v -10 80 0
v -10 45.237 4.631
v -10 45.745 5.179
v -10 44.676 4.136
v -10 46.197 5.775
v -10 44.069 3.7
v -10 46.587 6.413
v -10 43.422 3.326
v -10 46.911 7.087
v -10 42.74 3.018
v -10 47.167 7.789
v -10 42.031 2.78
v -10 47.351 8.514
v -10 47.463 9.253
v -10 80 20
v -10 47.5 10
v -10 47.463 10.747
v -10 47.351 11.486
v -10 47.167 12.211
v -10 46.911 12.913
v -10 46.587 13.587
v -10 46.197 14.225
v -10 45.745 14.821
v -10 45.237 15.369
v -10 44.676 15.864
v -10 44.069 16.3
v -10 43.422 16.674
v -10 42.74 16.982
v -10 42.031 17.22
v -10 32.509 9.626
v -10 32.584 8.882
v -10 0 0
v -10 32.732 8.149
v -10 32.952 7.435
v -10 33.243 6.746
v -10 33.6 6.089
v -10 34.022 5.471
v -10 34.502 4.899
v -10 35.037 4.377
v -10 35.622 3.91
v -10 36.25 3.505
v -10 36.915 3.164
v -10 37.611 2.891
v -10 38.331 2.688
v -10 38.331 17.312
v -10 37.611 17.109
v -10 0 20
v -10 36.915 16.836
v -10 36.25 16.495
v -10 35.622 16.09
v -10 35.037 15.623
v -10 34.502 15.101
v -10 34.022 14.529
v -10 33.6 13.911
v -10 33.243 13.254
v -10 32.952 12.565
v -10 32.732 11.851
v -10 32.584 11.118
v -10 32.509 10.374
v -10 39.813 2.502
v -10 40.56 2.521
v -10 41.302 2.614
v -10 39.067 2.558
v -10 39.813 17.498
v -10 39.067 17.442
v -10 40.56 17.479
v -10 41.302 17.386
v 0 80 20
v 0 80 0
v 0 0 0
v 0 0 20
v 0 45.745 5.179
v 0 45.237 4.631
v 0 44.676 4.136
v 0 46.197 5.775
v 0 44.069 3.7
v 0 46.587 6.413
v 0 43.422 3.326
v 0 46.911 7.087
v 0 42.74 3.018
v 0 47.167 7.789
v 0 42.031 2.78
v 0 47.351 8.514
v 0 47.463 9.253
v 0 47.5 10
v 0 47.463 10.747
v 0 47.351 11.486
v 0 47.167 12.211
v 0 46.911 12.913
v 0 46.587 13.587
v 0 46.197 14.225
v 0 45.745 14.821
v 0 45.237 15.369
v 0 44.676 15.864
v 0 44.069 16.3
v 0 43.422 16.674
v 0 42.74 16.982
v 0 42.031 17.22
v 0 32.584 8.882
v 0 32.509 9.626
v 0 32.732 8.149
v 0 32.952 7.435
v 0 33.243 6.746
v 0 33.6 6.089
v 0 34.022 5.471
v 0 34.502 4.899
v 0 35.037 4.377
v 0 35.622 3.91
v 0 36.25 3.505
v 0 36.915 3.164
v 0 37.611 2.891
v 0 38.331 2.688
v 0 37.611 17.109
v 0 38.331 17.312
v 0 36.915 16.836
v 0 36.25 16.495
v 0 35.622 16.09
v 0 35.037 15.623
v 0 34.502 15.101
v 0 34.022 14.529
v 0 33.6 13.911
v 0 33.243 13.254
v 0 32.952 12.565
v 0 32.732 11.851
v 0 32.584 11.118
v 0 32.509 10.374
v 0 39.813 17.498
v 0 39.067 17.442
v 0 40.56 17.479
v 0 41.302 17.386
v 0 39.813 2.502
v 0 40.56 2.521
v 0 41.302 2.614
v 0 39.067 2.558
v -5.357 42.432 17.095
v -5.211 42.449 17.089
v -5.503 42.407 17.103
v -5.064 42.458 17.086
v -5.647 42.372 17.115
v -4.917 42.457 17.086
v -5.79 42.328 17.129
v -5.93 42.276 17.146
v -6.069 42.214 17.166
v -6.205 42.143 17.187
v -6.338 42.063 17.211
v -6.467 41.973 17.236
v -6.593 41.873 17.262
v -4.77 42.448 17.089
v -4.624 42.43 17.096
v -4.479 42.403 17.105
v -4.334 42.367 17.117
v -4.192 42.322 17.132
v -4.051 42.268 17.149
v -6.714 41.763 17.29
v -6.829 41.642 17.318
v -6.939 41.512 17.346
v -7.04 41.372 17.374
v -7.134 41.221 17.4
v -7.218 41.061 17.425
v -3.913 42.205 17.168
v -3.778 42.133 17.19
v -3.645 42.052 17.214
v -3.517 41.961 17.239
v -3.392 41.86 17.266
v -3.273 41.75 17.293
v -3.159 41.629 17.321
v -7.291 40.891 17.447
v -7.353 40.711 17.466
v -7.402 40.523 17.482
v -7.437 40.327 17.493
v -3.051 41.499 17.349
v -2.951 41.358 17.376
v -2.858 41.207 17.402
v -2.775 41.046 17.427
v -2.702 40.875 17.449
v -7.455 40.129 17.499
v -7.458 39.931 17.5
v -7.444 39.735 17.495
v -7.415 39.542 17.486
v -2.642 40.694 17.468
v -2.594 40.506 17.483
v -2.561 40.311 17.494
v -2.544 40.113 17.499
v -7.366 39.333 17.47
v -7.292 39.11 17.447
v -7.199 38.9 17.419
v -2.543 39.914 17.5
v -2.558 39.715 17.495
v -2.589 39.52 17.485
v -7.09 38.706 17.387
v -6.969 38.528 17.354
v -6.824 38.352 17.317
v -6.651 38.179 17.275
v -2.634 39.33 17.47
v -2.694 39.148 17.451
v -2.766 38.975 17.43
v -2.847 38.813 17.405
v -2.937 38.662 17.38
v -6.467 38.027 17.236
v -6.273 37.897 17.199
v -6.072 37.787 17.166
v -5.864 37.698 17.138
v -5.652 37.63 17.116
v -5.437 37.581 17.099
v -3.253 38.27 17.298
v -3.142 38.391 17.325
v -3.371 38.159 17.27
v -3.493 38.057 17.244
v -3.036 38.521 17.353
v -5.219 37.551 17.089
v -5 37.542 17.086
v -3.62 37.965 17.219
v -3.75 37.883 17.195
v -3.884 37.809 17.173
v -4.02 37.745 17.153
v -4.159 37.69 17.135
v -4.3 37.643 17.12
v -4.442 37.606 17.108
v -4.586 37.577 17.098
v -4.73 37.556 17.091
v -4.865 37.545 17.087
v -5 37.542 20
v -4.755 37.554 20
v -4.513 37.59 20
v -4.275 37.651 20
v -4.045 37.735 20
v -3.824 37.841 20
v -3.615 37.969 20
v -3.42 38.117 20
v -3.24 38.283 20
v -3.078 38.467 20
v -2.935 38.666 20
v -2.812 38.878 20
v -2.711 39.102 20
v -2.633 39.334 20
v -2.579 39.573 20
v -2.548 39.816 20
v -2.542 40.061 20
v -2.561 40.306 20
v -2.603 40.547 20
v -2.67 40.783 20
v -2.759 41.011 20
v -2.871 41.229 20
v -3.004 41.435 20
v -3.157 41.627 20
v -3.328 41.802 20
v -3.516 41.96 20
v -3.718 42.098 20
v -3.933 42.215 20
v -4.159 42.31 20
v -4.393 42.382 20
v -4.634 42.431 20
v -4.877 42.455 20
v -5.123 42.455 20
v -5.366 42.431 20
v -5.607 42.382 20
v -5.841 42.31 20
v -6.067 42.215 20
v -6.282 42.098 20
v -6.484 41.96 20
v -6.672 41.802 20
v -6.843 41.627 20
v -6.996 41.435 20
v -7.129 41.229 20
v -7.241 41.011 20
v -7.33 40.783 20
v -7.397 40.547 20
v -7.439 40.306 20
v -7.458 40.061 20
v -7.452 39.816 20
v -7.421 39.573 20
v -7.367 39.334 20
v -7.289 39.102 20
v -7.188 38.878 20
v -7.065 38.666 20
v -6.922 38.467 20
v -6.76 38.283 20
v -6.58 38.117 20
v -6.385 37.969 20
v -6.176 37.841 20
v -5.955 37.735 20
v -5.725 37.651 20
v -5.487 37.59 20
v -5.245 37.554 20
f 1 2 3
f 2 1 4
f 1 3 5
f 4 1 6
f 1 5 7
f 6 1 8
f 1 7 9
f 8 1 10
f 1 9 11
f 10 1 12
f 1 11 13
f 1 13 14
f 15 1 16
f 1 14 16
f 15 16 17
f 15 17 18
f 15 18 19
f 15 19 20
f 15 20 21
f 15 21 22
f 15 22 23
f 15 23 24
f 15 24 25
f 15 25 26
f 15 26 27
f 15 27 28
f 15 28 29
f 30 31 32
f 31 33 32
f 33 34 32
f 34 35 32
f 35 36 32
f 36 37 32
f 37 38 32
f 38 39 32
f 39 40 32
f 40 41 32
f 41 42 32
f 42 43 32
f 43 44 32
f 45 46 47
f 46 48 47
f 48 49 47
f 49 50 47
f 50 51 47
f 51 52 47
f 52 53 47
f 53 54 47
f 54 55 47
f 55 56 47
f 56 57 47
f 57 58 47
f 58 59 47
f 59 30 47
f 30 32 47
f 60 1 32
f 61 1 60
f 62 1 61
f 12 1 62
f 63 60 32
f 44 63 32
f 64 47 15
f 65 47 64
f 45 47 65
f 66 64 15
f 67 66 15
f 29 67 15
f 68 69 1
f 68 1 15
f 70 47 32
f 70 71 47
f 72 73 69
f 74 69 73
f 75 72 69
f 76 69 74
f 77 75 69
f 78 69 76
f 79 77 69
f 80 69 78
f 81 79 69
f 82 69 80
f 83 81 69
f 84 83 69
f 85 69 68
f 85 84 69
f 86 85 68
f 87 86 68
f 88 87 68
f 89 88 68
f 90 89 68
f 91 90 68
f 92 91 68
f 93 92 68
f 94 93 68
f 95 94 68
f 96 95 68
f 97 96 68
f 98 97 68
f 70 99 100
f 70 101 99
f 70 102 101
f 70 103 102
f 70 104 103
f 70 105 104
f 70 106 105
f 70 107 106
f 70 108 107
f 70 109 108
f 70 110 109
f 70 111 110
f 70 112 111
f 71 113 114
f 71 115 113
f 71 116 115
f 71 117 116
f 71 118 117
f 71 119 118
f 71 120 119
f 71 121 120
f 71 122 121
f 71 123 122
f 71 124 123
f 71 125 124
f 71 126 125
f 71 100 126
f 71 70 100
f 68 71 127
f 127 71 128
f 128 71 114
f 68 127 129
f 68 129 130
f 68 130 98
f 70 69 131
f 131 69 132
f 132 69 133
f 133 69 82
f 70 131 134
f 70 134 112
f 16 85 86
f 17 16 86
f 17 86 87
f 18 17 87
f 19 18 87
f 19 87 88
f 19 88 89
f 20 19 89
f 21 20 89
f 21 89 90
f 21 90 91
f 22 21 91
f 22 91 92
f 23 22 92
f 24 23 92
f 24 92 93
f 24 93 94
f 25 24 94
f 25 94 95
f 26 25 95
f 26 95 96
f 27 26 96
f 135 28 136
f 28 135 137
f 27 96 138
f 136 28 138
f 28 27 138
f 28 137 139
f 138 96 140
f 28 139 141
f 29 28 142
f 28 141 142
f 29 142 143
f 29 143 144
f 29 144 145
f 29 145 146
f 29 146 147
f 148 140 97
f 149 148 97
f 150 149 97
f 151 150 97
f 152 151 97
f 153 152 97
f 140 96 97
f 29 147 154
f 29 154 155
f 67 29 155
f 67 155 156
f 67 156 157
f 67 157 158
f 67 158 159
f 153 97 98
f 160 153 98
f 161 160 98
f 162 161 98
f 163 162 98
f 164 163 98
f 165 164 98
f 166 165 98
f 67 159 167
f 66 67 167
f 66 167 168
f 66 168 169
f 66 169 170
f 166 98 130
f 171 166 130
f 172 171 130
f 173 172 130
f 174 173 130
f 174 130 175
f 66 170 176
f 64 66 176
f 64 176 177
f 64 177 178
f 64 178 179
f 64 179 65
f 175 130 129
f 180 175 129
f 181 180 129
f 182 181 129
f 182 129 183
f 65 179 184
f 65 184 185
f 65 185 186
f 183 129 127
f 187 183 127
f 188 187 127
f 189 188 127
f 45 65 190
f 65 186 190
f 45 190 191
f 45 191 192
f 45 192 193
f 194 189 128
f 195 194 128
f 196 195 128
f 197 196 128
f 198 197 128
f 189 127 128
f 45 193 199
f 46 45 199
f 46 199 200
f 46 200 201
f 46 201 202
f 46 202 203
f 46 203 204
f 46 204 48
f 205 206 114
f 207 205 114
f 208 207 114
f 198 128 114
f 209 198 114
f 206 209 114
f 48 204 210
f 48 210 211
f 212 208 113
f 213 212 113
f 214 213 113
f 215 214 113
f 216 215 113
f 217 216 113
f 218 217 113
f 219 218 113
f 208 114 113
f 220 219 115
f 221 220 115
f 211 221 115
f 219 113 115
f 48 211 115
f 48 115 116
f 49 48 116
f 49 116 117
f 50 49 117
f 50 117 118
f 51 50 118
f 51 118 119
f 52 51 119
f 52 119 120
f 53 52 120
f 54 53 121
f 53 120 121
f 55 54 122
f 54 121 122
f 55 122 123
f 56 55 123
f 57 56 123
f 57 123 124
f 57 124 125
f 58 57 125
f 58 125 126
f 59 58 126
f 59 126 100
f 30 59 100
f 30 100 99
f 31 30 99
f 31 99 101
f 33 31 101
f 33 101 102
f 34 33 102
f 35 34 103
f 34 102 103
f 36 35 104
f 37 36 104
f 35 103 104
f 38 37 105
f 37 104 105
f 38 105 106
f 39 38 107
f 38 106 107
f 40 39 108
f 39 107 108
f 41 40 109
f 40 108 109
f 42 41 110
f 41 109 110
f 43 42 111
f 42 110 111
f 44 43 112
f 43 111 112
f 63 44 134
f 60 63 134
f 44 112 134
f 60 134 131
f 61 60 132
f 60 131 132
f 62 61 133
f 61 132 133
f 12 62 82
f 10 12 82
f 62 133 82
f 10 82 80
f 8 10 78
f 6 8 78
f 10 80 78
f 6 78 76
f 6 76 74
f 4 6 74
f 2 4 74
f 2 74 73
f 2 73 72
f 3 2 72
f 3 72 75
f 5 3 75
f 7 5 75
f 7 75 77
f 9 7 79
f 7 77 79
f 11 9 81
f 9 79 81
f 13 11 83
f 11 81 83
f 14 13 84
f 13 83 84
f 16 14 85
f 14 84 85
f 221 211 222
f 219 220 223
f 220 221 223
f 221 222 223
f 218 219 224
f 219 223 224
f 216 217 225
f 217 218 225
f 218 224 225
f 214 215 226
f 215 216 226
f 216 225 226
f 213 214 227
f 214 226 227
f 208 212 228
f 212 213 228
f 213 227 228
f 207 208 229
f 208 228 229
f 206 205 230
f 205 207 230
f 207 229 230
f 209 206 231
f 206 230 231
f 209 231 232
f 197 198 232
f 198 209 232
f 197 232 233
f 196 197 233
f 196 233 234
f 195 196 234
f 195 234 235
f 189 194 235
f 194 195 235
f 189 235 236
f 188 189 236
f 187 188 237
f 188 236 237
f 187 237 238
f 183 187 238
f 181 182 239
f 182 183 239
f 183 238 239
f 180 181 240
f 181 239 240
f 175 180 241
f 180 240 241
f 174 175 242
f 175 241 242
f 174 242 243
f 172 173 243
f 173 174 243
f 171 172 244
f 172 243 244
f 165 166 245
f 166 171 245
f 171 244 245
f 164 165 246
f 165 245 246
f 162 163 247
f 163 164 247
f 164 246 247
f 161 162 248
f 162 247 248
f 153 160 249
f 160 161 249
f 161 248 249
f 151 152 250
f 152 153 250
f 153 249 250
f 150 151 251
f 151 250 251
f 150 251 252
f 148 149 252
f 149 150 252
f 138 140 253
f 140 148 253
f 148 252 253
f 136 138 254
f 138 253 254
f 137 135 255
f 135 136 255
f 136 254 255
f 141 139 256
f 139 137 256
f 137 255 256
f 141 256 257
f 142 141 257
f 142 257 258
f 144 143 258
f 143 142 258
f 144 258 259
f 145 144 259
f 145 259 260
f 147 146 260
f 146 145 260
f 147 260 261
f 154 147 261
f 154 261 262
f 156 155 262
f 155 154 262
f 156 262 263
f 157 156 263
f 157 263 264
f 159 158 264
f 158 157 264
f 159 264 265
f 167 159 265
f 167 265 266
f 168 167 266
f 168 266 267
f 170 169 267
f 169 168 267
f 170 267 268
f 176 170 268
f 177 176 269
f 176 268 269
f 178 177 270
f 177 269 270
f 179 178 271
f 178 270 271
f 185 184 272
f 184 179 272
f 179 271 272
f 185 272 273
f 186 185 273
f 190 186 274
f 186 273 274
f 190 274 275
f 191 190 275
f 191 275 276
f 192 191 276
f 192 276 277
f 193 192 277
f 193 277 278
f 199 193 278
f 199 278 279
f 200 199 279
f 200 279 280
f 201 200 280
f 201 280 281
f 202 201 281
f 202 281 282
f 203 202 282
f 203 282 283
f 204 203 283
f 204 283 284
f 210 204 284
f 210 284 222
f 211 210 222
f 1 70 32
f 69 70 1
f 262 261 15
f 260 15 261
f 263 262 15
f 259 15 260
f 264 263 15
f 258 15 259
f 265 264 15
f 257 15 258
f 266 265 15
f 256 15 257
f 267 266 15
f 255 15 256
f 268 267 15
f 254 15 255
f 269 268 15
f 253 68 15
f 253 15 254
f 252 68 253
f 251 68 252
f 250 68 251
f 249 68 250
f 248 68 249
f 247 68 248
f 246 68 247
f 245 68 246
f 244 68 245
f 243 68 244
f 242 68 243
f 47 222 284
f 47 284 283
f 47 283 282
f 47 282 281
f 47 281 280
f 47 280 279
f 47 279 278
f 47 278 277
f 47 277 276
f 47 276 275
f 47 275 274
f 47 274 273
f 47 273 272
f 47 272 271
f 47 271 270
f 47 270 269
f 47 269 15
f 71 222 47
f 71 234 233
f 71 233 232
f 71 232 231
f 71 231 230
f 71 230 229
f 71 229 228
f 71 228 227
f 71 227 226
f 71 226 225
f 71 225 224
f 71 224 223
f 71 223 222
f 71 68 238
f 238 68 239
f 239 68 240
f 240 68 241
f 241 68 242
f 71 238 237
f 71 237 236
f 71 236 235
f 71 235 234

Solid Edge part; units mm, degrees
sketch "Sketch1" plane through (0, 0, 0) normal (1, 0, 0) x (0, 1, 0)
  line L0 (80, 0) -> (80, 20)
  line L1 (80, 20) -> (0, 20)
  line L2 (0, 20) -> (0, 0)
  line L3 (0, 0) -> (80, 0)
extrude "Protrusion1" add sketch "Sketch1" against normal blind 10
sketch "Sketch2" plane through (0, 32.5, 7.5) normal (1, 0, 0) x (0, 1, 0)
  circle A0 centre (7.5, 2.5) radius 7.5
extrude "Cutout1" cut sketch "Sketch2" against normal through all
hole "Bohrung_1" at (-5, 40, 20) direction (0, 0, -1) diameter 4.917 end up to next
